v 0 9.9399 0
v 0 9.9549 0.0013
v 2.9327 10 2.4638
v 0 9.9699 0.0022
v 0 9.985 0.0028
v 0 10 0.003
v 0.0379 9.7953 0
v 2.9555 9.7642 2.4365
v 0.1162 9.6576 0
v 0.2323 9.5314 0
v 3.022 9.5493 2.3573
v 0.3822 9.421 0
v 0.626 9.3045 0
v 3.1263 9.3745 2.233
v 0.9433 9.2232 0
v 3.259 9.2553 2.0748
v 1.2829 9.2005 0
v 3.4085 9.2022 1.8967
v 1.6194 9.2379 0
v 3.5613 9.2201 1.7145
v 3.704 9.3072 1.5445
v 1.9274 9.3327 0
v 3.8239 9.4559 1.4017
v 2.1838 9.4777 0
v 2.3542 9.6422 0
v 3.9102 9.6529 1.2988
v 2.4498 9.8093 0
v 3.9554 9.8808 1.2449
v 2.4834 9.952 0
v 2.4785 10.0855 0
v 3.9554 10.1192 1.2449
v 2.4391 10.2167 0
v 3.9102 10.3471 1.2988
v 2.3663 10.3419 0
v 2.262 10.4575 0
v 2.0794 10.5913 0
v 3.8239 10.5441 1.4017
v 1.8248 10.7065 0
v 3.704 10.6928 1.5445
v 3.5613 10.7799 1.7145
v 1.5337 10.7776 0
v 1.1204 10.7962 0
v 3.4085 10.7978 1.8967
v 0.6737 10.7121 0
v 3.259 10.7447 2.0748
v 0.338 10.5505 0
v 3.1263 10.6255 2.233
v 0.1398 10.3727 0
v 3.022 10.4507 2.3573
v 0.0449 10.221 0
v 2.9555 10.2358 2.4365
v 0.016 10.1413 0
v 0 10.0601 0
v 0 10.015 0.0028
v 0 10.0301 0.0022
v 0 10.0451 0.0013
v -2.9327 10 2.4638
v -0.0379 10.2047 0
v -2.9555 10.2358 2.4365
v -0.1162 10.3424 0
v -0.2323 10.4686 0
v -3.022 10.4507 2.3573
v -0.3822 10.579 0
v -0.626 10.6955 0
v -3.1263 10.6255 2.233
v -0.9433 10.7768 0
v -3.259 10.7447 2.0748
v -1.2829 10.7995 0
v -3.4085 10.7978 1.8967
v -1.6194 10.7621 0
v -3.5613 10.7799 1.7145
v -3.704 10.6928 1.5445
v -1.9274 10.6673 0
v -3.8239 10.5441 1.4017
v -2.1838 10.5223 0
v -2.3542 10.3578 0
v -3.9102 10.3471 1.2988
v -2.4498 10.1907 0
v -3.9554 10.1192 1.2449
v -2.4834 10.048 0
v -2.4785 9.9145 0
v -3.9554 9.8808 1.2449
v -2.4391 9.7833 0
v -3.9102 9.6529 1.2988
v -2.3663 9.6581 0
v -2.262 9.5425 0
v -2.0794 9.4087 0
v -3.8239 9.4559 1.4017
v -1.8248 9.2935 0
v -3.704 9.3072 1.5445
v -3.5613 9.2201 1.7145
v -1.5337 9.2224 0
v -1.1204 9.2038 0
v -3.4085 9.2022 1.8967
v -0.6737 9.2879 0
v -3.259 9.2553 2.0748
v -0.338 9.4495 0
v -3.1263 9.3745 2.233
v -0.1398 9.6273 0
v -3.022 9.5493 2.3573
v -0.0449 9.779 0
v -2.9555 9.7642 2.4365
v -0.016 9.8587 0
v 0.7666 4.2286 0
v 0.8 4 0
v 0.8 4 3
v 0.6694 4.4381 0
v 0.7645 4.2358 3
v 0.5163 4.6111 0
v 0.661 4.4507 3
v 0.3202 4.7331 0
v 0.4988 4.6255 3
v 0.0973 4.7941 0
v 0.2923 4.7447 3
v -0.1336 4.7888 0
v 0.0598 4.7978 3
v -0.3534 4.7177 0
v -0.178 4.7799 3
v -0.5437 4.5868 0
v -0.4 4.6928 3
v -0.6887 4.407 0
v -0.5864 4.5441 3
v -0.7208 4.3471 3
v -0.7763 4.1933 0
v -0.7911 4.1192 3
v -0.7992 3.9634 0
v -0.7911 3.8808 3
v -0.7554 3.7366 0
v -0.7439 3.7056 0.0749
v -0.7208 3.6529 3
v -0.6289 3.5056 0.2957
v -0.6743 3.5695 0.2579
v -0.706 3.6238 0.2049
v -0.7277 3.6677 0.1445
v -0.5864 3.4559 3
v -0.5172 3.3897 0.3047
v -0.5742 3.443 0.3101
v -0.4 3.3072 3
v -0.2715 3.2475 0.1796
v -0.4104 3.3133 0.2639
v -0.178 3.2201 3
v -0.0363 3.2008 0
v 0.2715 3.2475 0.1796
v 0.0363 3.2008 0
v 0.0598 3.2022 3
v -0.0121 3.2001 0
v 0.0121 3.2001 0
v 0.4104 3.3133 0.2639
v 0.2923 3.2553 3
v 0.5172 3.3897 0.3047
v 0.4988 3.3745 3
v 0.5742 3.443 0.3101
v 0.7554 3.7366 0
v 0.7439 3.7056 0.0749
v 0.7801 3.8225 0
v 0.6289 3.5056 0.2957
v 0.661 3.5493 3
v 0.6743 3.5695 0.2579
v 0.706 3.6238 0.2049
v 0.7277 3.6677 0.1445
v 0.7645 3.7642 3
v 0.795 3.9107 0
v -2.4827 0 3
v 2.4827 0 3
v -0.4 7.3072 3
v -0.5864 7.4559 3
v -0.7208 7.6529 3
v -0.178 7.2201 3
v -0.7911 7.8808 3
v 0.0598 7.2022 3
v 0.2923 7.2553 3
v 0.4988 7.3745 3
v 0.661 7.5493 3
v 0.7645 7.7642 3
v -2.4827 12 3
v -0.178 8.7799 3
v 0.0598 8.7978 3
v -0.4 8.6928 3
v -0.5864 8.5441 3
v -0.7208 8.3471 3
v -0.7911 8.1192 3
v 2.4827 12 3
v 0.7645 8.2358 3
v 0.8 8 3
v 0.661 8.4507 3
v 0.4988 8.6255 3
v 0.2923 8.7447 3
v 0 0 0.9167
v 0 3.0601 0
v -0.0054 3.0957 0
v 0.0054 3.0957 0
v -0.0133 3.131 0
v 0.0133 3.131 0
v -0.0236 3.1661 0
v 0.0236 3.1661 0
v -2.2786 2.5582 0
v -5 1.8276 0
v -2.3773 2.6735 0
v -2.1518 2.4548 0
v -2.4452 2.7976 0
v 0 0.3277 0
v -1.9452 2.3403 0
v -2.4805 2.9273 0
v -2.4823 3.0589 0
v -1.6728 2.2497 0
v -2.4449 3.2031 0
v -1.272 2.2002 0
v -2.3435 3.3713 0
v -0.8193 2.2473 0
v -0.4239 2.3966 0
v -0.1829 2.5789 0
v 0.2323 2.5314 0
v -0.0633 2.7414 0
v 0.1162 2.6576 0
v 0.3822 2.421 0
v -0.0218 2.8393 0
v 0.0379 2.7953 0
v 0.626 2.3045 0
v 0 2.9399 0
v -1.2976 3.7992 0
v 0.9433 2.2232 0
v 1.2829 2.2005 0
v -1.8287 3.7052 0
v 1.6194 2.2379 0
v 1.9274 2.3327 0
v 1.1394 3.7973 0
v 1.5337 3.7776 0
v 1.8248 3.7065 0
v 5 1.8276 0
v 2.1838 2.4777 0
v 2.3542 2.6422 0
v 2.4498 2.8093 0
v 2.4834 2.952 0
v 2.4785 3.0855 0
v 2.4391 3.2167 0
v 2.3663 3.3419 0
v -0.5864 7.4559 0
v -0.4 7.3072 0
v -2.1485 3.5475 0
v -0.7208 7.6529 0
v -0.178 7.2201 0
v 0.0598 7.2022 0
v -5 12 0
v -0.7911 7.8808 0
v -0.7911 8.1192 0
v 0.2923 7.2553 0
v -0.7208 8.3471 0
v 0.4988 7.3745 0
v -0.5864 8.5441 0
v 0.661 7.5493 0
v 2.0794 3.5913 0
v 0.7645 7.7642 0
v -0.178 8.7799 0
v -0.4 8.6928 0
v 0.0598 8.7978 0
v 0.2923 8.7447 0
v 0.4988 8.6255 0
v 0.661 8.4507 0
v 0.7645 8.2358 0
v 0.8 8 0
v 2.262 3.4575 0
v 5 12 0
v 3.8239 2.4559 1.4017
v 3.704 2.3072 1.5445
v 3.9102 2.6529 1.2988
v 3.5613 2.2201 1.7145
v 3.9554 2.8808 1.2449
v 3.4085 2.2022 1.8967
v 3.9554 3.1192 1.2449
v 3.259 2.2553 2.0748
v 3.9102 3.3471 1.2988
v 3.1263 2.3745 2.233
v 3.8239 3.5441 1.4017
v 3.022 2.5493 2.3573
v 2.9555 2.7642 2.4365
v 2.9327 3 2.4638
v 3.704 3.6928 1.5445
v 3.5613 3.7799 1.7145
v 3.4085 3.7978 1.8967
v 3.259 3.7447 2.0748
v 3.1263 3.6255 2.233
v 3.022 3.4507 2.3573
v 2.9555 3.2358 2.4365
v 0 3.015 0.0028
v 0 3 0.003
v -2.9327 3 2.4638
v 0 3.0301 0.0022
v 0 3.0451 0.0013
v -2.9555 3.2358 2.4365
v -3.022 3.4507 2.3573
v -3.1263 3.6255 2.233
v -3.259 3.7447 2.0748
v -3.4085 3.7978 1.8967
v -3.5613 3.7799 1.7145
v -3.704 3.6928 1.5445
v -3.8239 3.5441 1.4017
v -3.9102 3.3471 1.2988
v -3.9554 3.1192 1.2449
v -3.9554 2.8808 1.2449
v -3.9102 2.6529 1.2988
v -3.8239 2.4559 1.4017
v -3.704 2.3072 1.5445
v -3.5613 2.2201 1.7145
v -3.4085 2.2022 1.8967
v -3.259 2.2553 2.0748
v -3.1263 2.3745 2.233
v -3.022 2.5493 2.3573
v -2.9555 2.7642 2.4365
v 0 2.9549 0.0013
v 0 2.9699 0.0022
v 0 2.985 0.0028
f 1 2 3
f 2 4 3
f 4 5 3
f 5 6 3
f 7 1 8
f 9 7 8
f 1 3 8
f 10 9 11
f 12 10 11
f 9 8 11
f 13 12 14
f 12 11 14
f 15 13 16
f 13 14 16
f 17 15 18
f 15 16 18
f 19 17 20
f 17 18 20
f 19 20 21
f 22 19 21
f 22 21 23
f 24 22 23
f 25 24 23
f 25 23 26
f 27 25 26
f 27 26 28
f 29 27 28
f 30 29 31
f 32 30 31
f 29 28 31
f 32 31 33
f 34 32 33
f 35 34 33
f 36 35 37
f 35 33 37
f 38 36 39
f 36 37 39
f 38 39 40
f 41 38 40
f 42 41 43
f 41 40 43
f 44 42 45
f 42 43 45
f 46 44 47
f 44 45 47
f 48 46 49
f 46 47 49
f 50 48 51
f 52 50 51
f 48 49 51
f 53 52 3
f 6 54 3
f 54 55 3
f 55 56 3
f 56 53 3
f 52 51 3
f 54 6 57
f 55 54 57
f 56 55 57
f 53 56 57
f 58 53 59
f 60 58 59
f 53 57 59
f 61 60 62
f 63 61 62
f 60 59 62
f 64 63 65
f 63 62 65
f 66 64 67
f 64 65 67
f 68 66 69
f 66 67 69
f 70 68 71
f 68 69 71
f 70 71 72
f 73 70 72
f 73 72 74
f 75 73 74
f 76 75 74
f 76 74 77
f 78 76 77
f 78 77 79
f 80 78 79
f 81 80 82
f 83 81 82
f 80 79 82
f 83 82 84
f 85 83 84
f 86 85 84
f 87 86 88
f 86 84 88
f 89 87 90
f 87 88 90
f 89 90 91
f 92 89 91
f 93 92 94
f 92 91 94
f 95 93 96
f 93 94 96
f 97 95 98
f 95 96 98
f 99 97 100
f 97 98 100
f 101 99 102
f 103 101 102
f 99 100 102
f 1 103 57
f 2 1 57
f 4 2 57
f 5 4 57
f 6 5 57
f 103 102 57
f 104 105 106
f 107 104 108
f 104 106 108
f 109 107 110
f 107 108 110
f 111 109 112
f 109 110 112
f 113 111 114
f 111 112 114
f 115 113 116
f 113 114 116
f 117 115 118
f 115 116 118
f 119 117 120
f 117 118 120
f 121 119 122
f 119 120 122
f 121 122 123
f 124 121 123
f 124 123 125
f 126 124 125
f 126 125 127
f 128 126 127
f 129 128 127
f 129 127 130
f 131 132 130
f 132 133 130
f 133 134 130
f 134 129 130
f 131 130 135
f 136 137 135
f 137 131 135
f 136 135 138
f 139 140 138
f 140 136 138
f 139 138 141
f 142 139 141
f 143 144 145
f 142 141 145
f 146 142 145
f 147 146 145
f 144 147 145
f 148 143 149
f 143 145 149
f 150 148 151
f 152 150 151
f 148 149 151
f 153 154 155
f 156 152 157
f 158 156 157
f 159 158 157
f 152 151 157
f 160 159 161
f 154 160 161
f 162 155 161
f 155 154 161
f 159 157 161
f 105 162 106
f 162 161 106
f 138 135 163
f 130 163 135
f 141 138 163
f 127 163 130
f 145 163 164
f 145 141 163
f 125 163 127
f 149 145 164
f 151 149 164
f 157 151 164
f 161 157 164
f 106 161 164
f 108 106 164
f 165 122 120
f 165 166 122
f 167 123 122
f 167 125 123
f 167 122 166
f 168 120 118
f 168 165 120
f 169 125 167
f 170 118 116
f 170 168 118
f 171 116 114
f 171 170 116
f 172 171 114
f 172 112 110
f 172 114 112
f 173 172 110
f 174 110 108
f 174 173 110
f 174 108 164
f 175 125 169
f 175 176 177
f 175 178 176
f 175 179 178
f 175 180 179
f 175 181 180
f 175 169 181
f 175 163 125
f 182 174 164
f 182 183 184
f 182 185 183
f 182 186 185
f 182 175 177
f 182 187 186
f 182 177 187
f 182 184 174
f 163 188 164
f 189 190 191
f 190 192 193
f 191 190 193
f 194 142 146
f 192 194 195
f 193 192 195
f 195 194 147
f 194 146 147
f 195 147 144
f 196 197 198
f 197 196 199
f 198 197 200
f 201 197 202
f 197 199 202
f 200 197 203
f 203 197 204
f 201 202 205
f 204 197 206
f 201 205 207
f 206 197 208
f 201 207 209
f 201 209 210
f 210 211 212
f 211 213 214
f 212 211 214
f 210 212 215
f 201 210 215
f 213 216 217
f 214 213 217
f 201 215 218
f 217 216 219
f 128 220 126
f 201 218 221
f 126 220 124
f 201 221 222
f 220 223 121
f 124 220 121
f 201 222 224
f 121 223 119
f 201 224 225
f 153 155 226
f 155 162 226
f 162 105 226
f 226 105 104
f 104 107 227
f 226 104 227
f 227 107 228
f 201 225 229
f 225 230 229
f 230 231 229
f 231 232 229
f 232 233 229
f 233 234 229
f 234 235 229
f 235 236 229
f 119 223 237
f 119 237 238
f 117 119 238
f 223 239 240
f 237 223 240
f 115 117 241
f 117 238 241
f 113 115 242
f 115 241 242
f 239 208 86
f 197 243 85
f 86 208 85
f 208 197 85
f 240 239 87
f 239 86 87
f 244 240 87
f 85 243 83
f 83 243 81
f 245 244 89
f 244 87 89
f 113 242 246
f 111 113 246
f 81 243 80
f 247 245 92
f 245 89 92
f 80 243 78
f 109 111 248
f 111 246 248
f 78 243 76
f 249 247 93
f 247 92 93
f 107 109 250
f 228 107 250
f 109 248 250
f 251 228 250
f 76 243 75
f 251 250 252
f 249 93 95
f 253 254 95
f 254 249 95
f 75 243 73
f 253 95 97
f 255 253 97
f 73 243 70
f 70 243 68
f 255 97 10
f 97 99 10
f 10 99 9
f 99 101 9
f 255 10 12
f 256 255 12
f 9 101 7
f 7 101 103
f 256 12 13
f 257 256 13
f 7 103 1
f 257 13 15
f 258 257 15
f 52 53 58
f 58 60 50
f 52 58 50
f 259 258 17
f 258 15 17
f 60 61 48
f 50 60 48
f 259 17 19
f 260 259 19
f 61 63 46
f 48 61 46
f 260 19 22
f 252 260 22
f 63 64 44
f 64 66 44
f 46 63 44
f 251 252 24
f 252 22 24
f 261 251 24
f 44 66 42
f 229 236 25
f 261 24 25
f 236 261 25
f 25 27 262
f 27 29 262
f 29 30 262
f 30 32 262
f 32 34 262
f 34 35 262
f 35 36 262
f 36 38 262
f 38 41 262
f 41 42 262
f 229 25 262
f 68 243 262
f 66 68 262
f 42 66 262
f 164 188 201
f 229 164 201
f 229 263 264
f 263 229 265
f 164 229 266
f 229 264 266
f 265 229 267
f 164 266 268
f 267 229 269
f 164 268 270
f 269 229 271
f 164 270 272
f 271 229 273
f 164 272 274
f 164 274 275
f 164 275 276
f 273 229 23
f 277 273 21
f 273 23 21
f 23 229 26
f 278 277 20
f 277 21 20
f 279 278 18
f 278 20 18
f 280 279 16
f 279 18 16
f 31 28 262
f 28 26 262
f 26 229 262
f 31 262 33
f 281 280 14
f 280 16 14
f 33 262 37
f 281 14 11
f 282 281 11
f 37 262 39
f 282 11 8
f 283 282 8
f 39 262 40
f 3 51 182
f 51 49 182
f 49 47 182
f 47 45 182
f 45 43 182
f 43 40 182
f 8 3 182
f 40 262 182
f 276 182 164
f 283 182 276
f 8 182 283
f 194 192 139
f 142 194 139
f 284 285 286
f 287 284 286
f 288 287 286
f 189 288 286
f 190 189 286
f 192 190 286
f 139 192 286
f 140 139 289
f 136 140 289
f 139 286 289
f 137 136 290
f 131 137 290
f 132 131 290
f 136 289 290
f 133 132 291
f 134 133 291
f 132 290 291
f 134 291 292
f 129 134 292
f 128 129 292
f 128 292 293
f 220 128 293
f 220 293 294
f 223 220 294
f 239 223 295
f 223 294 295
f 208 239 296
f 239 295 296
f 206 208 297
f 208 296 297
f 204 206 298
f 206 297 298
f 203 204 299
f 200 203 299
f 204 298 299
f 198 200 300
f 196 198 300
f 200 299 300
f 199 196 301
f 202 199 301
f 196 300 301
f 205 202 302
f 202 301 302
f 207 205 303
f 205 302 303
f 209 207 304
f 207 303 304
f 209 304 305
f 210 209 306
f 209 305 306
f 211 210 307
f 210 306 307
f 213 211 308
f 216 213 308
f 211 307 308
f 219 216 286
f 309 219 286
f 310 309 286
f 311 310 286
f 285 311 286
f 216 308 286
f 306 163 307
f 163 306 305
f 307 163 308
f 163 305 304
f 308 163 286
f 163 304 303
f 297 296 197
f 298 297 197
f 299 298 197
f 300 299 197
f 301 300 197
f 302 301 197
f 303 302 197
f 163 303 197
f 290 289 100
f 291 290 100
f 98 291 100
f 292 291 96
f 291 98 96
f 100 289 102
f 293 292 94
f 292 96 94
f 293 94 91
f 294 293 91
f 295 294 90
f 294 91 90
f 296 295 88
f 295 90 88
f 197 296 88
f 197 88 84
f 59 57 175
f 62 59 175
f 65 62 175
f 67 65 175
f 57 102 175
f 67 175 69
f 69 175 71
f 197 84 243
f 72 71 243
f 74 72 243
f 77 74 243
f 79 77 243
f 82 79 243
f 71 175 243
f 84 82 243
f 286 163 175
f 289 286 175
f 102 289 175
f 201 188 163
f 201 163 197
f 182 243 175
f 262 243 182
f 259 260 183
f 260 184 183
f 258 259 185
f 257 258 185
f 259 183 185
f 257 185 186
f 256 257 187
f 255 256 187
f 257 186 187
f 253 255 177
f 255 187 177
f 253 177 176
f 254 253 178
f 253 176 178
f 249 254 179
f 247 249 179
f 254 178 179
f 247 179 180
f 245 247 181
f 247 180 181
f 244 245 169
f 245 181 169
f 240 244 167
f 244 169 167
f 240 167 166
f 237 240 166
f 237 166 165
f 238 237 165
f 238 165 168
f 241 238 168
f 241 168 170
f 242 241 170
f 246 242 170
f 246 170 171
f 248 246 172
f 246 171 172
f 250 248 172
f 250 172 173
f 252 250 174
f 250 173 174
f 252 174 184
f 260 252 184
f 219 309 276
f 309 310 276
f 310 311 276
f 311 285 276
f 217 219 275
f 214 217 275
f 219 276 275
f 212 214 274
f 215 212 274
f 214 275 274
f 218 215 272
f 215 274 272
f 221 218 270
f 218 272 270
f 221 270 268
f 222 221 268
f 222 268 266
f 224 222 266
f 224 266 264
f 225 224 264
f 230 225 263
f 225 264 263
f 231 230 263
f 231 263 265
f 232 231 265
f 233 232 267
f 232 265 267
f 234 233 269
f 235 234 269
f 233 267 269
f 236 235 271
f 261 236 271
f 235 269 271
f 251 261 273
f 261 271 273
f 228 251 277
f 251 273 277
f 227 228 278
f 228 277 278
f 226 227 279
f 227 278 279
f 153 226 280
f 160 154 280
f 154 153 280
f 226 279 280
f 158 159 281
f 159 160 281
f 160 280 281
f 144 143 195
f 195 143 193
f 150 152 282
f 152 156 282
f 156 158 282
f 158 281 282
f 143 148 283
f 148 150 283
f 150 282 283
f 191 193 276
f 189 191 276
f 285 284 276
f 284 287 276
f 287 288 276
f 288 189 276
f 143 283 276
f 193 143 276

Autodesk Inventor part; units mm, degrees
ref_plane "YZ Plane" through (0, 0, 0) normal (1, 0, 0) x (0, 1, 0)
ref_plane "XZ Plane" through (0, 0, 0) normal (0, 1, 0) x (-1, 0, 0)
ref_plane "XY Plane" through (0, 0, 0) normal (0, 0, 1) x (1, 0, 0)
sketch "スケッチ1" plane through (0, 0, 0) normal (0, 0, 1) x (1, 0, 0)
  line L0 (-5, 12) -> (5, 12)
  line L1 (5, 12) -> (5, 0)
  line L2 (5, 0) -> (-5, 0)
  line L3 (-5, 0) -> (-5, 12)
  line L4 (-8.0749, 12) -> (-5, 12) construction
  point P0 (0, 0)
  point P1 (0, 12)
  point P2 (0, 0)
  dimension "d0" = 12
  dimension "d1" = 10
  dimension "d2" = 10
extrude "押し出し1" add sketch "スケッチ1" along normal blind 3
sketch "スケッチ2" plane through (-5, 12, 0) normal (0, 1, 0) x (1, 0, 0)
  line L0 (0, -3) -> (10, -3) projected
  line L1 (0, 0) -> (10, 0) projected
  line L2 (2.5173, -3) -> (0, 0)
  line L3 (10, 0) -> (7.4827, -3)
  line L4 (0, 0) -> (0, -3) projected
  line L5 (10, 0) -> (10, -3) projected
  point P0 (5, 0)
  dimension "d5" = 80
  dimension "d6" = 40
  dimension "d7" = 40
extrude "押し出し2" cut sketch "スケッチ2" against normal through all contours L4 L2 L0 | L3 L5 L0
sketch "スケッチ3" plane through (-5, 0, 0) normal (-0.766, 0, 0.6428) x (0.6428, 0, 0.766)
  line L0 (3.9162, 0) -> (0, 0) projected
  line L1 (3.9162, 12) -> (3.9162, 0) projected
  line L2 (0, 12) -> (3.9162, 12) projected
  line L3 (0, 12) -> (0, 0) projected
  line L4 (3.9162, 0) -> (7.1079, 0) projected
  line L5 (3.9162, 0) -> (-11.0838, 7)
  point P0 (3.2139, 0)
  point P1 (0, 1.8276)
  dimension "d10" = 15
  dimension "d11" = 7
extrude "押し出し3" cut sketch "スケッチ3" against normal through all contours L0 L3 L5
sketch "スケッチ4" plane through (5, 0, 0) normal (0.766, 0, 0.6428) x (0.6428, 0, -0.766)
  line L0 (0, 0) -> (-3.9162, 0) projected
  line L1 (0, 0) -> (0, 12) projected
  line L2 (-3.9162, 12) -> (0, 12) projected
  line L3 (-3.9162, 0) -> (-3.9162, 12) projected
  line L4 (-3.9162, 0) -> (11.0838, 7)
  point P0 (-3.2139, 0)
  point P1 (0, 1.8276)
  dimension "d14" = 15
  dimension "d15" = 7
extrude "押し出し4" cut sketch "スケッチ4" against normal through all contours L0 L4 L1
sketch "スケッチ13" plane through (-5, 1.8276, 0) normal (-0.766, 0, 0.6428) x (0.6428, 0, 0.766)
  circle A0 centre (2.4162, 8.1724) radius 0.8 projected
  circle A1 centre (2.4162, 1.1724) radius 0.8 projected
  point P0 (3.2139, -1.8276)
extrude "押し出し13" cut sketch "スケッチ13" against normal through all
mirror "ミラー1" about plane through (0, 0, 0) normal (1, 0, 0) of "押し出し13"
sketch "スケッチ15" plane through (0, 0, 3) normal (0, 0, 1) x (1, 0, 0)
  line L0 (-2.4827, 0) -> (2.4827, 0) projected
  line L1 (2.4827, 12) -> (-2.4827, 12) projected
  circle A0 centre (0, 4) radius 0.8
  circle A1 centre (0, 8) radius 0.8
  point P0 (0, 0)
  point P1 (0, 0)
  dimension "d44" = 1.6
  dimension "d45" = 1.6
  dimension "d46" = 4
  dimension "d47" = 4
  dimension "d49" = 4
extrude "押し出し14" cut sketch "スケッチ15" against normal through all
equation "\"d6\" = d7"
equation "\"d47\" = d49"
properties part number "antana_middle"
